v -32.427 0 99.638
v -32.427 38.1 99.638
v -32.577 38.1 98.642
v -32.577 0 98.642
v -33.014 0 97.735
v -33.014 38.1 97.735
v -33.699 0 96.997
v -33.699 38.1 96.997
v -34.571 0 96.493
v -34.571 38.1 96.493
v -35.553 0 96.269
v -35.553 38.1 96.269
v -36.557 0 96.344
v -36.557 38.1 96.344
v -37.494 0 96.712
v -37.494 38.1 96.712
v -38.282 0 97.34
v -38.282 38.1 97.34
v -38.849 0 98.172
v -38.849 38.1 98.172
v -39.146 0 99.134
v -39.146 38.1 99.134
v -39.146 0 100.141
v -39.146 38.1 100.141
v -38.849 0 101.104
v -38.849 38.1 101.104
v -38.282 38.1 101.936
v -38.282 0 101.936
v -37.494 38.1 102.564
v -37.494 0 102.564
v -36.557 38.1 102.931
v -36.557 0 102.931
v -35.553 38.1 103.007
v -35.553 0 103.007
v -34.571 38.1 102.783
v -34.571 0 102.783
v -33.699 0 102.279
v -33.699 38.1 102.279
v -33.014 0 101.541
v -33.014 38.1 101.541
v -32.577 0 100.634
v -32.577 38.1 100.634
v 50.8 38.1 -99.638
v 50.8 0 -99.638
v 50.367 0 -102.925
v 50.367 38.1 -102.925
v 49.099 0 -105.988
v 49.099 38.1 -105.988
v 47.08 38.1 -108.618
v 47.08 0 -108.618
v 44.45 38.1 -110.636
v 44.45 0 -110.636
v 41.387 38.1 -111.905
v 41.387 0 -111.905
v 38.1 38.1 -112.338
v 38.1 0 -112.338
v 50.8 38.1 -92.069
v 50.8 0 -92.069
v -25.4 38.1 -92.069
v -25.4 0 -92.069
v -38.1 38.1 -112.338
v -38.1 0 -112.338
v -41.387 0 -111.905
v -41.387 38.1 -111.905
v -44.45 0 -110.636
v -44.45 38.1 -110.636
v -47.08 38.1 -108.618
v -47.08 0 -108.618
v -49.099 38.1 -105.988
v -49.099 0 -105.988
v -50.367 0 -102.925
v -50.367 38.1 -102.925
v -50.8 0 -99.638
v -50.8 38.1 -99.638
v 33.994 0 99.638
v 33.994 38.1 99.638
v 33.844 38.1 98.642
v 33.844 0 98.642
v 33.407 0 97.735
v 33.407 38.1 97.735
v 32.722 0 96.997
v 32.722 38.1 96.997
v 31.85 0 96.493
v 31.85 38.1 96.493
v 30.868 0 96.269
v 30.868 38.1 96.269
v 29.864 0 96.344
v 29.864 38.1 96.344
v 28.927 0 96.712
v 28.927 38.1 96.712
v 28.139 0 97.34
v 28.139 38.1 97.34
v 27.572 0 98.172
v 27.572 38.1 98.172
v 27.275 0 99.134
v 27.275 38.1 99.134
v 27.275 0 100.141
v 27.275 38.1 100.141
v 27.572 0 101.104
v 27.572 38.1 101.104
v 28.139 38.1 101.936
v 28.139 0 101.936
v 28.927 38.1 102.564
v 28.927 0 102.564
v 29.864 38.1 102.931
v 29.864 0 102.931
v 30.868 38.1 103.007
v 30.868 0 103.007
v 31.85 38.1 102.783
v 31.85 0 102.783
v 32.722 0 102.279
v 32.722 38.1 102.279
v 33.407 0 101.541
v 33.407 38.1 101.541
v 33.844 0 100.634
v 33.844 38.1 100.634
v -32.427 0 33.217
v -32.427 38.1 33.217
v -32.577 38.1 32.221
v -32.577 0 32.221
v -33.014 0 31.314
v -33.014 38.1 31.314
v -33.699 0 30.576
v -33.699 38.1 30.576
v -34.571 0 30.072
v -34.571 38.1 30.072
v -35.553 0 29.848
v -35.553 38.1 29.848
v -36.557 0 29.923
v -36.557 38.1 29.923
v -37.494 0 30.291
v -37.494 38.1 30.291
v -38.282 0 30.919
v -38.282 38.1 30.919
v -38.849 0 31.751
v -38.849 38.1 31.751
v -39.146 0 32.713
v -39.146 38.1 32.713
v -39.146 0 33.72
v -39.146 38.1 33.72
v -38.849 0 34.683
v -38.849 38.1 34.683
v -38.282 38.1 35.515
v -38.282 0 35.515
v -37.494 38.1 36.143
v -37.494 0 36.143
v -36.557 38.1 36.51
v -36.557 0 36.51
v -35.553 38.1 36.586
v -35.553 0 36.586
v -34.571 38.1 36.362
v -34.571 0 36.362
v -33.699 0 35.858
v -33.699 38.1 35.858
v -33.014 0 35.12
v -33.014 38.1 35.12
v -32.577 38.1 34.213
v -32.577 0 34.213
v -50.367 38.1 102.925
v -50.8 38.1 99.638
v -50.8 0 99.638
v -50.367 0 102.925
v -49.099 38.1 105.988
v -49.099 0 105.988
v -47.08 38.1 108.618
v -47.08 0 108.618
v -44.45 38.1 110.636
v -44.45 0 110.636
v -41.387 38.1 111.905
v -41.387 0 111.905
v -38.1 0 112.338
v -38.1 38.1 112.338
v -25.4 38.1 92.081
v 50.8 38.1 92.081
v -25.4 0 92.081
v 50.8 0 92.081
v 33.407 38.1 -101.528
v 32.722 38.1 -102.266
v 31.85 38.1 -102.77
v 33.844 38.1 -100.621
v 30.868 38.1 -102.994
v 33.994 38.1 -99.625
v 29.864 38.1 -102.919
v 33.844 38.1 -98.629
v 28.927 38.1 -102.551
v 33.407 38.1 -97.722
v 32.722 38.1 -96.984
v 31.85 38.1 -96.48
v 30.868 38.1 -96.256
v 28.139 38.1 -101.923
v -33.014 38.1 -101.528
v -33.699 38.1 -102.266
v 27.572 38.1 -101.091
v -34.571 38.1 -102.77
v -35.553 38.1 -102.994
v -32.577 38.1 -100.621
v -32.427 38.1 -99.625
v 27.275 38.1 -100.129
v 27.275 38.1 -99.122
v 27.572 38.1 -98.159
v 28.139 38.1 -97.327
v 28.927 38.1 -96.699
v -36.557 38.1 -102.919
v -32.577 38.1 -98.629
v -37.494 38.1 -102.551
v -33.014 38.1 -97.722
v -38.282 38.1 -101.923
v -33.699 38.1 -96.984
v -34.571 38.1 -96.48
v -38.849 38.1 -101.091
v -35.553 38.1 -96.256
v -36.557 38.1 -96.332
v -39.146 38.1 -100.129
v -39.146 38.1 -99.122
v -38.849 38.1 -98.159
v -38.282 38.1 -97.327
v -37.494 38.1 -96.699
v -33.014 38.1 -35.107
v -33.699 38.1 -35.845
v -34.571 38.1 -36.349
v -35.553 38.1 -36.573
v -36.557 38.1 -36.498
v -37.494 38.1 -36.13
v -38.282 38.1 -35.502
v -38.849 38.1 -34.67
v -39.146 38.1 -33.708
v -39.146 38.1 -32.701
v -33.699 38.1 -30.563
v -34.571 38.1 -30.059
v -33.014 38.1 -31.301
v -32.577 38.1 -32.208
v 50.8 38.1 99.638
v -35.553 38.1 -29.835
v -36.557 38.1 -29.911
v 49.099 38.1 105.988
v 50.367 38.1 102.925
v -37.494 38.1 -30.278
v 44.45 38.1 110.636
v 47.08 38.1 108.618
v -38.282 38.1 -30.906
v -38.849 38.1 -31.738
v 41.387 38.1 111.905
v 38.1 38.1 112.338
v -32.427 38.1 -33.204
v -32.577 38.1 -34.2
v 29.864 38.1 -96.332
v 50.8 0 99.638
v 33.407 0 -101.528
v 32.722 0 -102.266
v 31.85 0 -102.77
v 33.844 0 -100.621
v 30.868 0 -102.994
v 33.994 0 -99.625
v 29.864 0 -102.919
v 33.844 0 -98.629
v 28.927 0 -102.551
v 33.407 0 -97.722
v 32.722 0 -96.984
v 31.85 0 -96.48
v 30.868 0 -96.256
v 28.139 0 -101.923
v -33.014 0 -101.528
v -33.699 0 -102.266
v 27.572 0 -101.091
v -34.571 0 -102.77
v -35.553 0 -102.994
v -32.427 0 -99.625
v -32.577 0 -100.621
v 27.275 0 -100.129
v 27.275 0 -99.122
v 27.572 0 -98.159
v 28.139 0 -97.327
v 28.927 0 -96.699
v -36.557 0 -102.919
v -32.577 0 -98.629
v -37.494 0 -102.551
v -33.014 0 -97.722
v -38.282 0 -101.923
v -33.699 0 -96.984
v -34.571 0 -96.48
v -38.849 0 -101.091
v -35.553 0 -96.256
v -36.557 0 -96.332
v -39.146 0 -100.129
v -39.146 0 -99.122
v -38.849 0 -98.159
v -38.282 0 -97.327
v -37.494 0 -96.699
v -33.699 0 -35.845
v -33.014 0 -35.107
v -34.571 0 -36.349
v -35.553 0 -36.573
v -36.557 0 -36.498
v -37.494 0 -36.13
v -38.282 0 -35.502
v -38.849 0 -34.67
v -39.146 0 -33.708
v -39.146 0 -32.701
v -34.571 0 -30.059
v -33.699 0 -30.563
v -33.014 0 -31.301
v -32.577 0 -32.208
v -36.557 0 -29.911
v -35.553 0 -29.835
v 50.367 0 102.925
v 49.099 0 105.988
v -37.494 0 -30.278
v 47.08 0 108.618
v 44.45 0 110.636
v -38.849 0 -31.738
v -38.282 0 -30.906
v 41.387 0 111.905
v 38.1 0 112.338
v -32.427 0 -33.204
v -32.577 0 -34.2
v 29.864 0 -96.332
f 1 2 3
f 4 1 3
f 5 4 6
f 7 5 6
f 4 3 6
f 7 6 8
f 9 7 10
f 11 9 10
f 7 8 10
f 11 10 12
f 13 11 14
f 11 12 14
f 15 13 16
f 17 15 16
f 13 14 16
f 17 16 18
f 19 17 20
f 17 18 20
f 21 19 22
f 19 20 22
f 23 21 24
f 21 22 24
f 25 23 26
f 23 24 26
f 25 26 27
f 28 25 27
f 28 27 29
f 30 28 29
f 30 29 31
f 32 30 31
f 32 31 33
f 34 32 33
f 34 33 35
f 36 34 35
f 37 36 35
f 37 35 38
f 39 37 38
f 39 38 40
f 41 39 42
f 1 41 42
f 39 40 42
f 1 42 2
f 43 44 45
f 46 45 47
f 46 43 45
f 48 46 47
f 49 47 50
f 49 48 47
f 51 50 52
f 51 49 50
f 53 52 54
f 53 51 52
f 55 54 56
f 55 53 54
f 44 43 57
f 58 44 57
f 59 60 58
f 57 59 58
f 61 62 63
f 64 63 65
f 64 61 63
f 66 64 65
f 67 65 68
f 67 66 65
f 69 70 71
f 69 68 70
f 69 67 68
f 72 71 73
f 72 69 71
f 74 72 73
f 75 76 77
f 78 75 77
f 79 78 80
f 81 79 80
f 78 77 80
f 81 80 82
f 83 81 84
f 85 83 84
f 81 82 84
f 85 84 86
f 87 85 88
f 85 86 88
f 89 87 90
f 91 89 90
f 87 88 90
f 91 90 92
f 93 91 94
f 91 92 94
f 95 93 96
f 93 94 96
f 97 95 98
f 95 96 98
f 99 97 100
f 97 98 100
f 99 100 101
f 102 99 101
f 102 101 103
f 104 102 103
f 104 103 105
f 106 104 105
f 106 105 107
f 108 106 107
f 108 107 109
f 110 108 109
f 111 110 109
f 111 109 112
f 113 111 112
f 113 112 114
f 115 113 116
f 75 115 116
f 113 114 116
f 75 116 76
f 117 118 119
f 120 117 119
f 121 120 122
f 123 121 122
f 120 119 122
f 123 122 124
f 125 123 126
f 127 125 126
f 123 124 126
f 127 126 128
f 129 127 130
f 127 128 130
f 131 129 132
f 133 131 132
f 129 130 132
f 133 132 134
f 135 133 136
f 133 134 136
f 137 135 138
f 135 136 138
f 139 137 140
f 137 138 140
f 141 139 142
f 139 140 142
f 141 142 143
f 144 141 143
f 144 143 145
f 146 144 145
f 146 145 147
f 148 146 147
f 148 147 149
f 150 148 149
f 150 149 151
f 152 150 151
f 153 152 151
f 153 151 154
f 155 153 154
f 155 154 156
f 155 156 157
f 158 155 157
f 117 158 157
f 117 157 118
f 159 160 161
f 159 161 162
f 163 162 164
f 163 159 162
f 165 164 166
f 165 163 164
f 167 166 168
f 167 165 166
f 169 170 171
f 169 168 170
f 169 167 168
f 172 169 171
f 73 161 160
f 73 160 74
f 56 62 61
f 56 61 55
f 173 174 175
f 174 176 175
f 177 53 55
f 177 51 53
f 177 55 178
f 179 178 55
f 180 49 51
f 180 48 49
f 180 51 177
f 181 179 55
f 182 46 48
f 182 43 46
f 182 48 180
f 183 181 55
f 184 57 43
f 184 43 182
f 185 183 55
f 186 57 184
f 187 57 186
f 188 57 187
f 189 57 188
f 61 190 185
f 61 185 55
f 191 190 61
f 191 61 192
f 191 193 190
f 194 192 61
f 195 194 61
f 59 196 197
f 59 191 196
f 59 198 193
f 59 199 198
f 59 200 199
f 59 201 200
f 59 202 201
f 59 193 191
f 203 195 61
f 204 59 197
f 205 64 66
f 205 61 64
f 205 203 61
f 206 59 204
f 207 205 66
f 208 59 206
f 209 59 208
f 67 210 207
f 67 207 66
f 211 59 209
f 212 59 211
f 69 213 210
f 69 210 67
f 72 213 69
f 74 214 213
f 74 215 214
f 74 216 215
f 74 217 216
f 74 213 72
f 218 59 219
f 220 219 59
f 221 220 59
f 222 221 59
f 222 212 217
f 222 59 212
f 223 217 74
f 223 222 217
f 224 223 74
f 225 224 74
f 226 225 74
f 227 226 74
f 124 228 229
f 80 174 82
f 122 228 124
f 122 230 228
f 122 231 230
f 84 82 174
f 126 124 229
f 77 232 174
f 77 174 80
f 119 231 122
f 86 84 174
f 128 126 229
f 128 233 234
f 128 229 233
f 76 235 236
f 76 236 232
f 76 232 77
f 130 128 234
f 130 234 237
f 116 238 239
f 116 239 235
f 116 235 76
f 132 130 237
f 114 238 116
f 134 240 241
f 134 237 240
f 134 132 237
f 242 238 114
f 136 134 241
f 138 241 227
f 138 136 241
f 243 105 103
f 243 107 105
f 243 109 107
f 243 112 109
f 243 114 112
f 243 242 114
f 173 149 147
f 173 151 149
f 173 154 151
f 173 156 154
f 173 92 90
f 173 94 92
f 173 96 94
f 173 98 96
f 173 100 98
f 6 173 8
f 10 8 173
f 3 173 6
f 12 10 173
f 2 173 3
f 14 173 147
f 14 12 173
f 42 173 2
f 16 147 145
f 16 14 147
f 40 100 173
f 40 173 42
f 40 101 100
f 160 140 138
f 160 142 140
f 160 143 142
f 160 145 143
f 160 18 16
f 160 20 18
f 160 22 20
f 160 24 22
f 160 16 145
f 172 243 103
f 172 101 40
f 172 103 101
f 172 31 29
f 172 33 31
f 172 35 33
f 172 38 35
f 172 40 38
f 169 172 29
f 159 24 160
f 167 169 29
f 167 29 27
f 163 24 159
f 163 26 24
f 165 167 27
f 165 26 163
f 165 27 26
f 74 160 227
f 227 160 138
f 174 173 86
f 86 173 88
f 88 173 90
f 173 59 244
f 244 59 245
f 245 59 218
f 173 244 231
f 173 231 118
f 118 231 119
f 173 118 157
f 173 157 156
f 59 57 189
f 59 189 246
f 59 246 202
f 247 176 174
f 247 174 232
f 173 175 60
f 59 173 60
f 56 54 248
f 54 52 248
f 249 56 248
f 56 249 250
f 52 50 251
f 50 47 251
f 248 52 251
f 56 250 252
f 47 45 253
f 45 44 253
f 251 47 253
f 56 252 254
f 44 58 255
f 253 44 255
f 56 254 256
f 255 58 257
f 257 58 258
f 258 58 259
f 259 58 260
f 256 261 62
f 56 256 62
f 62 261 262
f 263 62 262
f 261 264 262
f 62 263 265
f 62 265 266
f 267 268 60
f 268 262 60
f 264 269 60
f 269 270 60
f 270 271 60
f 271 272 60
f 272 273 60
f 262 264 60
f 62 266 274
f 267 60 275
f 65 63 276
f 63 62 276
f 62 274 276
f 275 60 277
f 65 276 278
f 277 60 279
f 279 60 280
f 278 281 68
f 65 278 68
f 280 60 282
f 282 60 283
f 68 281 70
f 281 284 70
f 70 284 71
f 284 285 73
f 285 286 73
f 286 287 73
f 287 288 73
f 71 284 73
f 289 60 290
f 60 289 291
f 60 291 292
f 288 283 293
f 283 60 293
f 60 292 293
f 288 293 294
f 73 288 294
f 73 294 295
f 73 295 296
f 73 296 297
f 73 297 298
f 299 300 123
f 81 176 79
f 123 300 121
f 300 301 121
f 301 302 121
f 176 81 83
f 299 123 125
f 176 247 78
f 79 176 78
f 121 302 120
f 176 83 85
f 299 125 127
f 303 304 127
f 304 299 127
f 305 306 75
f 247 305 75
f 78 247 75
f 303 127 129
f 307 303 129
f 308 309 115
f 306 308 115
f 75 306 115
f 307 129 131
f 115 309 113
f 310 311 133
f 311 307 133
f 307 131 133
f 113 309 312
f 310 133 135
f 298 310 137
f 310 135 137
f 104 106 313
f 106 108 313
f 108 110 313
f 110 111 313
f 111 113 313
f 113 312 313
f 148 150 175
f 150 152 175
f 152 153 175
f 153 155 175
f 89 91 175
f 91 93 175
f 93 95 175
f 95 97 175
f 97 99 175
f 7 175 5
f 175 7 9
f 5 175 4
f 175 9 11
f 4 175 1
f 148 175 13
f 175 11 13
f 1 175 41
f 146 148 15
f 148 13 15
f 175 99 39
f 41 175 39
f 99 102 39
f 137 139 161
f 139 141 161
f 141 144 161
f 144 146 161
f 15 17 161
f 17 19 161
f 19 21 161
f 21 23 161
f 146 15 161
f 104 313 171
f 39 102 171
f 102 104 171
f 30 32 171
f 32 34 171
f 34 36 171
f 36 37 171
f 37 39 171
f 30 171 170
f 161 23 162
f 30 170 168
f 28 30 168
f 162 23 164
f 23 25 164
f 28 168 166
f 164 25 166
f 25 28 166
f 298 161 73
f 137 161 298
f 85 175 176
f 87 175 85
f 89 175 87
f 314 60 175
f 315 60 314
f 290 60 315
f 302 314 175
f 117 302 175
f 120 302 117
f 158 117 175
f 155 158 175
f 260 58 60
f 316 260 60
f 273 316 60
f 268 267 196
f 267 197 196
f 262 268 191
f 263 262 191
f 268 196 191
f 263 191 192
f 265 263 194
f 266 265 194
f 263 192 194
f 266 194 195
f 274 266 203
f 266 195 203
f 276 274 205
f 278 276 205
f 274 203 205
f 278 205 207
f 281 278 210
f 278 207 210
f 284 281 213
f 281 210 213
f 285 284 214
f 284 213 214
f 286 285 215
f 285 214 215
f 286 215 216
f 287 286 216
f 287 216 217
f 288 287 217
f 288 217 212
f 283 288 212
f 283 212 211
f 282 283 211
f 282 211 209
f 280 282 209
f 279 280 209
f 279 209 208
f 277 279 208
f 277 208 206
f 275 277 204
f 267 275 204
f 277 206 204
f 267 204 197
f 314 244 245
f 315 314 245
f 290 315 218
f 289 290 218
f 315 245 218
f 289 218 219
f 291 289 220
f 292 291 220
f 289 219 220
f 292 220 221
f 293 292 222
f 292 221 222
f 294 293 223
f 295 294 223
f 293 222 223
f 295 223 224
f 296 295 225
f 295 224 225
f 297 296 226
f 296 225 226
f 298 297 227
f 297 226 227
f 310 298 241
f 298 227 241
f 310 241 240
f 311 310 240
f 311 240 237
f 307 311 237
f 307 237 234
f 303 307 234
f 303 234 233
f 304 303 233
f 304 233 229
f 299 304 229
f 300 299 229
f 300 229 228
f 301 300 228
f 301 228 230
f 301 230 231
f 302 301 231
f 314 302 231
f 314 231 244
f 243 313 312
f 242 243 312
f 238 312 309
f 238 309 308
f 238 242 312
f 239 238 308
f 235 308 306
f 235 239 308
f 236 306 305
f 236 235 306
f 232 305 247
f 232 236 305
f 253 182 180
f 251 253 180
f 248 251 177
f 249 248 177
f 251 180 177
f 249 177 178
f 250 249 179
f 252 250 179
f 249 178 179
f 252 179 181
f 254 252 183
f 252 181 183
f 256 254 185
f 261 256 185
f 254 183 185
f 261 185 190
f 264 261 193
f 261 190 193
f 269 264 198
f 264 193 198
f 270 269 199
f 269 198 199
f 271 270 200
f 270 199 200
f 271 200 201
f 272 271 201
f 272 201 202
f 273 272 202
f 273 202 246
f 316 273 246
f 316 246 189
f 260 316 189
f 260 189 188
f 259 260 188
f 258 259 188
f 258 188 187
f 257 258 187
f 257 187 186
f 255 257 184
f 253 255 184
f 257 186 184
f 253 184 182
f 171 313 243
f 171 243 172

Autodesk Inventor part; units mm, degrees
ref_plane "YZ Plane" through (0, 0, 0) normal (1, 0, 0) x (0, 1, 0)
ref_plane "XZ Plane" through (0, 0, 0) normal (0, 1, 0) x (-1, 0, 0)
ref_plane "XY Plane" through (0, 0, 0) normal (0, 0, 1) x (1, 0, 0)
sketch "Sketch1" plane through (0, 0, 0) normal (0, 1, 0) x (-1, 0, 0)
  line L0 (-50.8, 112.3379) -> (50.8, 112.3379)
  line L1 (50.8, 112.3379) -> (50.8, -112.3378)
  line L2 (50.8, -112.3378) -> (-50.8, -112.3379)
  line L3 (-50.8, -112.3379) -> (-50.8, 112.3379)
  line L4 (-50.8, 112.3379) -> (50.8, -112.3378) construction
  line L5 (50.8, 112.3379) -> (-50.8, -112.3379) construction
  line L6 (-50.8, 92.0813) -> (25.4, 92.0813)
  line L7 (25.4, 92.0813) -> (25.4, -92.0686)
  line L8 (25.4, -92.0686) -> (-50.8, -92.0687)
  line L9 (0, 0) -> (56.1136, 0) construction
  line L10 (76.673, 0) -> (-65.4748, 0)
  line L11 (-31.0246, 99.6379) -> (-31.0246, 0.0063) construction
  line L12 (-31.0246, 0.0063) -> (34.0182, 0.0063) construction
  point P0 (25.4, 0.0063)
  point P1 (-31.0246, -99.6379)
  dimension "d0" = 101.6
  dimension "d56" = 184.15
  dimension "d57" = 76.2
  dimension "d58" = 76.2
  dimension "d60" = 12.7
  dimension "d61" = 12.7
  dimension "d62" = 99.6315
  dimension "d63" = 0
  dimension "d64" = 7.5692
extrude "Extrusion1" add sketch "Sketch1" along normal blind 38.1 contours L0 L1 L10 L7 L6 L3 | L1 L2 L3 L8 L7 L10
fillet "Fillet1" radius 12.7 4 edges at (50.8, 19.05, 112.3379) (-50.8, 19.05, 112.3379) (-50.8, 19.05, -112.3378) (50.8, 19.05, -112.3379)
sketch "Sketch2" plane through (0, 38.1, 0) normal (0, 1, 0) x (1, 0, 0)
  line L0 (-38.1, -112.3379) -> (38.1, -112.3379) projected
  circle A0 centre (-35.8052, -99.6379) radius 3.3782
  line L1 (-35.8052, -99.6379) -> (-35.8052, 103.5621) construction
  line L2 (-35.8052, -99.6379) -> (40.3948, -99.6379) construction
  line L3 (-35.8052, 103.5621) -> (40.3948, 103.5621) construction
  circle A1 centre (-35.8052, -86.3537) radius 3.3782 construction
  line L4 (-39.1834, -96.2597) -> (-30.0963, -96.2597) construction
  circle A2 centre (-35.8052, -73.0695) radius 3.3782 construction
  circle A3 centre (-35.8052, -59.7853) radius 3.3782 construction
  circle A4 centre (-35.8052, -46.5011) radius 3.3782 construction
  circle A5 centre (-35.8052, -33.2169) radius 3.3782 construction
  circle A6 centre (-35.8052, -19.9327) radius 3.3782 construction
  circle A7 centre (-35.8052, -6.6485) radius 3.3782 construction
  circle A8 centre (-35.8052, 6.6357) radius 3.3782 construction
  circle A9 centre (-35.8052, 19.9199) radius 3.3782 construction
  circle A10 centre (-35.8052, 33.2041) radius 3.3782 construction
  circle A11 centre (-35.8052, 46.4883) radius 3.3782 construction
  circle A12 centre (-35.8052, 59.7725) radius 3.3782 construction
  circle A13 centre (-35.8052, 73.0567) radius 3.3782 construction
  circle A14 centre (-35.8052, 86.3409) radius 3.3782 construction
  circle A15 centre (-35.8052, 99.6251) radius 3.3782 construction
  circle A16 centre (-22.521, -99.6379) radius 3.3782 construction
  circle A17 centre (-9.2368, -99.6379) radius 3.3782 construction
  circle A18 centre (4.0474, -99.6379) radius 3.3782 construction
  circle A19 centre (17.3316, -99.6379) radius 3.3782 construction
  circle A20 centre (30.6158, -99.6379) radius 3.3782 construction
  circle A21 centre (43.9, -99.6379) radius 3.3782 construction
  circle A22 centre (30.6158, 99.6251) radius 3.3782 construction
  circle A23 centre (30.6158, -99.6379) radius 3.3782 construction
  circle A24 centre (-35.8052, 99.6251) radius 3.3782 construction
  circle A25 centre (-35.8052, 33.2041) radius 3.3782 construction
  circle A26 centre (-35.8052, -33.2169) radius 3.3782 construction
  circle A27 centre (-35.8052, -33.2169) radius 3.3782
  circle A28 centre (-35.8052, 33.2041) radius 3.3782
  circle A29 centre (-35.8052, 99.6251) radius 3.3782
  circle A30 centre (30.6158, 99.6251) radius 3.3782
  circle A31 centre (30.6158, -99.6379) radius 3.3782
  point P0 (0, 0)
  point P1 (-35.8052, -23.4379)
  point P2 (-35.8052, 27.3621)
  dimension "d8" = 12.7
  dimension "d9" = 76.2
  dimension "d10" = 127
  dimension "d11" = 203.2
  dimension "d12" = 76.2
  dimension "d13" = 6.7564
  dimension "d22" = 13.2842
  dimension "d25" = 13.2842
  dimension "d30" = 13.2842
  dimension "d33" = 13.2842
  dimension "d38" = 6.7564
  dimension "d39" = 6.7564
  dimension "d40" = 6.7564
  dimension "d41" = 6.7564
  dimension "d42" = 6.7564
  dimension "d43" = 6.7564
  dimension "d44" = 6.7564
  dimension "d45" = 6.7564
  dimension "d46" = 6.7564
extrude "Extrusion4" cut sketch "Sketch2" against normal through all
equation "\"d25\" = d22"
equation "\"d30\" = d22"
equation "\"d33\" = d22"
properties part number "FBH!"
